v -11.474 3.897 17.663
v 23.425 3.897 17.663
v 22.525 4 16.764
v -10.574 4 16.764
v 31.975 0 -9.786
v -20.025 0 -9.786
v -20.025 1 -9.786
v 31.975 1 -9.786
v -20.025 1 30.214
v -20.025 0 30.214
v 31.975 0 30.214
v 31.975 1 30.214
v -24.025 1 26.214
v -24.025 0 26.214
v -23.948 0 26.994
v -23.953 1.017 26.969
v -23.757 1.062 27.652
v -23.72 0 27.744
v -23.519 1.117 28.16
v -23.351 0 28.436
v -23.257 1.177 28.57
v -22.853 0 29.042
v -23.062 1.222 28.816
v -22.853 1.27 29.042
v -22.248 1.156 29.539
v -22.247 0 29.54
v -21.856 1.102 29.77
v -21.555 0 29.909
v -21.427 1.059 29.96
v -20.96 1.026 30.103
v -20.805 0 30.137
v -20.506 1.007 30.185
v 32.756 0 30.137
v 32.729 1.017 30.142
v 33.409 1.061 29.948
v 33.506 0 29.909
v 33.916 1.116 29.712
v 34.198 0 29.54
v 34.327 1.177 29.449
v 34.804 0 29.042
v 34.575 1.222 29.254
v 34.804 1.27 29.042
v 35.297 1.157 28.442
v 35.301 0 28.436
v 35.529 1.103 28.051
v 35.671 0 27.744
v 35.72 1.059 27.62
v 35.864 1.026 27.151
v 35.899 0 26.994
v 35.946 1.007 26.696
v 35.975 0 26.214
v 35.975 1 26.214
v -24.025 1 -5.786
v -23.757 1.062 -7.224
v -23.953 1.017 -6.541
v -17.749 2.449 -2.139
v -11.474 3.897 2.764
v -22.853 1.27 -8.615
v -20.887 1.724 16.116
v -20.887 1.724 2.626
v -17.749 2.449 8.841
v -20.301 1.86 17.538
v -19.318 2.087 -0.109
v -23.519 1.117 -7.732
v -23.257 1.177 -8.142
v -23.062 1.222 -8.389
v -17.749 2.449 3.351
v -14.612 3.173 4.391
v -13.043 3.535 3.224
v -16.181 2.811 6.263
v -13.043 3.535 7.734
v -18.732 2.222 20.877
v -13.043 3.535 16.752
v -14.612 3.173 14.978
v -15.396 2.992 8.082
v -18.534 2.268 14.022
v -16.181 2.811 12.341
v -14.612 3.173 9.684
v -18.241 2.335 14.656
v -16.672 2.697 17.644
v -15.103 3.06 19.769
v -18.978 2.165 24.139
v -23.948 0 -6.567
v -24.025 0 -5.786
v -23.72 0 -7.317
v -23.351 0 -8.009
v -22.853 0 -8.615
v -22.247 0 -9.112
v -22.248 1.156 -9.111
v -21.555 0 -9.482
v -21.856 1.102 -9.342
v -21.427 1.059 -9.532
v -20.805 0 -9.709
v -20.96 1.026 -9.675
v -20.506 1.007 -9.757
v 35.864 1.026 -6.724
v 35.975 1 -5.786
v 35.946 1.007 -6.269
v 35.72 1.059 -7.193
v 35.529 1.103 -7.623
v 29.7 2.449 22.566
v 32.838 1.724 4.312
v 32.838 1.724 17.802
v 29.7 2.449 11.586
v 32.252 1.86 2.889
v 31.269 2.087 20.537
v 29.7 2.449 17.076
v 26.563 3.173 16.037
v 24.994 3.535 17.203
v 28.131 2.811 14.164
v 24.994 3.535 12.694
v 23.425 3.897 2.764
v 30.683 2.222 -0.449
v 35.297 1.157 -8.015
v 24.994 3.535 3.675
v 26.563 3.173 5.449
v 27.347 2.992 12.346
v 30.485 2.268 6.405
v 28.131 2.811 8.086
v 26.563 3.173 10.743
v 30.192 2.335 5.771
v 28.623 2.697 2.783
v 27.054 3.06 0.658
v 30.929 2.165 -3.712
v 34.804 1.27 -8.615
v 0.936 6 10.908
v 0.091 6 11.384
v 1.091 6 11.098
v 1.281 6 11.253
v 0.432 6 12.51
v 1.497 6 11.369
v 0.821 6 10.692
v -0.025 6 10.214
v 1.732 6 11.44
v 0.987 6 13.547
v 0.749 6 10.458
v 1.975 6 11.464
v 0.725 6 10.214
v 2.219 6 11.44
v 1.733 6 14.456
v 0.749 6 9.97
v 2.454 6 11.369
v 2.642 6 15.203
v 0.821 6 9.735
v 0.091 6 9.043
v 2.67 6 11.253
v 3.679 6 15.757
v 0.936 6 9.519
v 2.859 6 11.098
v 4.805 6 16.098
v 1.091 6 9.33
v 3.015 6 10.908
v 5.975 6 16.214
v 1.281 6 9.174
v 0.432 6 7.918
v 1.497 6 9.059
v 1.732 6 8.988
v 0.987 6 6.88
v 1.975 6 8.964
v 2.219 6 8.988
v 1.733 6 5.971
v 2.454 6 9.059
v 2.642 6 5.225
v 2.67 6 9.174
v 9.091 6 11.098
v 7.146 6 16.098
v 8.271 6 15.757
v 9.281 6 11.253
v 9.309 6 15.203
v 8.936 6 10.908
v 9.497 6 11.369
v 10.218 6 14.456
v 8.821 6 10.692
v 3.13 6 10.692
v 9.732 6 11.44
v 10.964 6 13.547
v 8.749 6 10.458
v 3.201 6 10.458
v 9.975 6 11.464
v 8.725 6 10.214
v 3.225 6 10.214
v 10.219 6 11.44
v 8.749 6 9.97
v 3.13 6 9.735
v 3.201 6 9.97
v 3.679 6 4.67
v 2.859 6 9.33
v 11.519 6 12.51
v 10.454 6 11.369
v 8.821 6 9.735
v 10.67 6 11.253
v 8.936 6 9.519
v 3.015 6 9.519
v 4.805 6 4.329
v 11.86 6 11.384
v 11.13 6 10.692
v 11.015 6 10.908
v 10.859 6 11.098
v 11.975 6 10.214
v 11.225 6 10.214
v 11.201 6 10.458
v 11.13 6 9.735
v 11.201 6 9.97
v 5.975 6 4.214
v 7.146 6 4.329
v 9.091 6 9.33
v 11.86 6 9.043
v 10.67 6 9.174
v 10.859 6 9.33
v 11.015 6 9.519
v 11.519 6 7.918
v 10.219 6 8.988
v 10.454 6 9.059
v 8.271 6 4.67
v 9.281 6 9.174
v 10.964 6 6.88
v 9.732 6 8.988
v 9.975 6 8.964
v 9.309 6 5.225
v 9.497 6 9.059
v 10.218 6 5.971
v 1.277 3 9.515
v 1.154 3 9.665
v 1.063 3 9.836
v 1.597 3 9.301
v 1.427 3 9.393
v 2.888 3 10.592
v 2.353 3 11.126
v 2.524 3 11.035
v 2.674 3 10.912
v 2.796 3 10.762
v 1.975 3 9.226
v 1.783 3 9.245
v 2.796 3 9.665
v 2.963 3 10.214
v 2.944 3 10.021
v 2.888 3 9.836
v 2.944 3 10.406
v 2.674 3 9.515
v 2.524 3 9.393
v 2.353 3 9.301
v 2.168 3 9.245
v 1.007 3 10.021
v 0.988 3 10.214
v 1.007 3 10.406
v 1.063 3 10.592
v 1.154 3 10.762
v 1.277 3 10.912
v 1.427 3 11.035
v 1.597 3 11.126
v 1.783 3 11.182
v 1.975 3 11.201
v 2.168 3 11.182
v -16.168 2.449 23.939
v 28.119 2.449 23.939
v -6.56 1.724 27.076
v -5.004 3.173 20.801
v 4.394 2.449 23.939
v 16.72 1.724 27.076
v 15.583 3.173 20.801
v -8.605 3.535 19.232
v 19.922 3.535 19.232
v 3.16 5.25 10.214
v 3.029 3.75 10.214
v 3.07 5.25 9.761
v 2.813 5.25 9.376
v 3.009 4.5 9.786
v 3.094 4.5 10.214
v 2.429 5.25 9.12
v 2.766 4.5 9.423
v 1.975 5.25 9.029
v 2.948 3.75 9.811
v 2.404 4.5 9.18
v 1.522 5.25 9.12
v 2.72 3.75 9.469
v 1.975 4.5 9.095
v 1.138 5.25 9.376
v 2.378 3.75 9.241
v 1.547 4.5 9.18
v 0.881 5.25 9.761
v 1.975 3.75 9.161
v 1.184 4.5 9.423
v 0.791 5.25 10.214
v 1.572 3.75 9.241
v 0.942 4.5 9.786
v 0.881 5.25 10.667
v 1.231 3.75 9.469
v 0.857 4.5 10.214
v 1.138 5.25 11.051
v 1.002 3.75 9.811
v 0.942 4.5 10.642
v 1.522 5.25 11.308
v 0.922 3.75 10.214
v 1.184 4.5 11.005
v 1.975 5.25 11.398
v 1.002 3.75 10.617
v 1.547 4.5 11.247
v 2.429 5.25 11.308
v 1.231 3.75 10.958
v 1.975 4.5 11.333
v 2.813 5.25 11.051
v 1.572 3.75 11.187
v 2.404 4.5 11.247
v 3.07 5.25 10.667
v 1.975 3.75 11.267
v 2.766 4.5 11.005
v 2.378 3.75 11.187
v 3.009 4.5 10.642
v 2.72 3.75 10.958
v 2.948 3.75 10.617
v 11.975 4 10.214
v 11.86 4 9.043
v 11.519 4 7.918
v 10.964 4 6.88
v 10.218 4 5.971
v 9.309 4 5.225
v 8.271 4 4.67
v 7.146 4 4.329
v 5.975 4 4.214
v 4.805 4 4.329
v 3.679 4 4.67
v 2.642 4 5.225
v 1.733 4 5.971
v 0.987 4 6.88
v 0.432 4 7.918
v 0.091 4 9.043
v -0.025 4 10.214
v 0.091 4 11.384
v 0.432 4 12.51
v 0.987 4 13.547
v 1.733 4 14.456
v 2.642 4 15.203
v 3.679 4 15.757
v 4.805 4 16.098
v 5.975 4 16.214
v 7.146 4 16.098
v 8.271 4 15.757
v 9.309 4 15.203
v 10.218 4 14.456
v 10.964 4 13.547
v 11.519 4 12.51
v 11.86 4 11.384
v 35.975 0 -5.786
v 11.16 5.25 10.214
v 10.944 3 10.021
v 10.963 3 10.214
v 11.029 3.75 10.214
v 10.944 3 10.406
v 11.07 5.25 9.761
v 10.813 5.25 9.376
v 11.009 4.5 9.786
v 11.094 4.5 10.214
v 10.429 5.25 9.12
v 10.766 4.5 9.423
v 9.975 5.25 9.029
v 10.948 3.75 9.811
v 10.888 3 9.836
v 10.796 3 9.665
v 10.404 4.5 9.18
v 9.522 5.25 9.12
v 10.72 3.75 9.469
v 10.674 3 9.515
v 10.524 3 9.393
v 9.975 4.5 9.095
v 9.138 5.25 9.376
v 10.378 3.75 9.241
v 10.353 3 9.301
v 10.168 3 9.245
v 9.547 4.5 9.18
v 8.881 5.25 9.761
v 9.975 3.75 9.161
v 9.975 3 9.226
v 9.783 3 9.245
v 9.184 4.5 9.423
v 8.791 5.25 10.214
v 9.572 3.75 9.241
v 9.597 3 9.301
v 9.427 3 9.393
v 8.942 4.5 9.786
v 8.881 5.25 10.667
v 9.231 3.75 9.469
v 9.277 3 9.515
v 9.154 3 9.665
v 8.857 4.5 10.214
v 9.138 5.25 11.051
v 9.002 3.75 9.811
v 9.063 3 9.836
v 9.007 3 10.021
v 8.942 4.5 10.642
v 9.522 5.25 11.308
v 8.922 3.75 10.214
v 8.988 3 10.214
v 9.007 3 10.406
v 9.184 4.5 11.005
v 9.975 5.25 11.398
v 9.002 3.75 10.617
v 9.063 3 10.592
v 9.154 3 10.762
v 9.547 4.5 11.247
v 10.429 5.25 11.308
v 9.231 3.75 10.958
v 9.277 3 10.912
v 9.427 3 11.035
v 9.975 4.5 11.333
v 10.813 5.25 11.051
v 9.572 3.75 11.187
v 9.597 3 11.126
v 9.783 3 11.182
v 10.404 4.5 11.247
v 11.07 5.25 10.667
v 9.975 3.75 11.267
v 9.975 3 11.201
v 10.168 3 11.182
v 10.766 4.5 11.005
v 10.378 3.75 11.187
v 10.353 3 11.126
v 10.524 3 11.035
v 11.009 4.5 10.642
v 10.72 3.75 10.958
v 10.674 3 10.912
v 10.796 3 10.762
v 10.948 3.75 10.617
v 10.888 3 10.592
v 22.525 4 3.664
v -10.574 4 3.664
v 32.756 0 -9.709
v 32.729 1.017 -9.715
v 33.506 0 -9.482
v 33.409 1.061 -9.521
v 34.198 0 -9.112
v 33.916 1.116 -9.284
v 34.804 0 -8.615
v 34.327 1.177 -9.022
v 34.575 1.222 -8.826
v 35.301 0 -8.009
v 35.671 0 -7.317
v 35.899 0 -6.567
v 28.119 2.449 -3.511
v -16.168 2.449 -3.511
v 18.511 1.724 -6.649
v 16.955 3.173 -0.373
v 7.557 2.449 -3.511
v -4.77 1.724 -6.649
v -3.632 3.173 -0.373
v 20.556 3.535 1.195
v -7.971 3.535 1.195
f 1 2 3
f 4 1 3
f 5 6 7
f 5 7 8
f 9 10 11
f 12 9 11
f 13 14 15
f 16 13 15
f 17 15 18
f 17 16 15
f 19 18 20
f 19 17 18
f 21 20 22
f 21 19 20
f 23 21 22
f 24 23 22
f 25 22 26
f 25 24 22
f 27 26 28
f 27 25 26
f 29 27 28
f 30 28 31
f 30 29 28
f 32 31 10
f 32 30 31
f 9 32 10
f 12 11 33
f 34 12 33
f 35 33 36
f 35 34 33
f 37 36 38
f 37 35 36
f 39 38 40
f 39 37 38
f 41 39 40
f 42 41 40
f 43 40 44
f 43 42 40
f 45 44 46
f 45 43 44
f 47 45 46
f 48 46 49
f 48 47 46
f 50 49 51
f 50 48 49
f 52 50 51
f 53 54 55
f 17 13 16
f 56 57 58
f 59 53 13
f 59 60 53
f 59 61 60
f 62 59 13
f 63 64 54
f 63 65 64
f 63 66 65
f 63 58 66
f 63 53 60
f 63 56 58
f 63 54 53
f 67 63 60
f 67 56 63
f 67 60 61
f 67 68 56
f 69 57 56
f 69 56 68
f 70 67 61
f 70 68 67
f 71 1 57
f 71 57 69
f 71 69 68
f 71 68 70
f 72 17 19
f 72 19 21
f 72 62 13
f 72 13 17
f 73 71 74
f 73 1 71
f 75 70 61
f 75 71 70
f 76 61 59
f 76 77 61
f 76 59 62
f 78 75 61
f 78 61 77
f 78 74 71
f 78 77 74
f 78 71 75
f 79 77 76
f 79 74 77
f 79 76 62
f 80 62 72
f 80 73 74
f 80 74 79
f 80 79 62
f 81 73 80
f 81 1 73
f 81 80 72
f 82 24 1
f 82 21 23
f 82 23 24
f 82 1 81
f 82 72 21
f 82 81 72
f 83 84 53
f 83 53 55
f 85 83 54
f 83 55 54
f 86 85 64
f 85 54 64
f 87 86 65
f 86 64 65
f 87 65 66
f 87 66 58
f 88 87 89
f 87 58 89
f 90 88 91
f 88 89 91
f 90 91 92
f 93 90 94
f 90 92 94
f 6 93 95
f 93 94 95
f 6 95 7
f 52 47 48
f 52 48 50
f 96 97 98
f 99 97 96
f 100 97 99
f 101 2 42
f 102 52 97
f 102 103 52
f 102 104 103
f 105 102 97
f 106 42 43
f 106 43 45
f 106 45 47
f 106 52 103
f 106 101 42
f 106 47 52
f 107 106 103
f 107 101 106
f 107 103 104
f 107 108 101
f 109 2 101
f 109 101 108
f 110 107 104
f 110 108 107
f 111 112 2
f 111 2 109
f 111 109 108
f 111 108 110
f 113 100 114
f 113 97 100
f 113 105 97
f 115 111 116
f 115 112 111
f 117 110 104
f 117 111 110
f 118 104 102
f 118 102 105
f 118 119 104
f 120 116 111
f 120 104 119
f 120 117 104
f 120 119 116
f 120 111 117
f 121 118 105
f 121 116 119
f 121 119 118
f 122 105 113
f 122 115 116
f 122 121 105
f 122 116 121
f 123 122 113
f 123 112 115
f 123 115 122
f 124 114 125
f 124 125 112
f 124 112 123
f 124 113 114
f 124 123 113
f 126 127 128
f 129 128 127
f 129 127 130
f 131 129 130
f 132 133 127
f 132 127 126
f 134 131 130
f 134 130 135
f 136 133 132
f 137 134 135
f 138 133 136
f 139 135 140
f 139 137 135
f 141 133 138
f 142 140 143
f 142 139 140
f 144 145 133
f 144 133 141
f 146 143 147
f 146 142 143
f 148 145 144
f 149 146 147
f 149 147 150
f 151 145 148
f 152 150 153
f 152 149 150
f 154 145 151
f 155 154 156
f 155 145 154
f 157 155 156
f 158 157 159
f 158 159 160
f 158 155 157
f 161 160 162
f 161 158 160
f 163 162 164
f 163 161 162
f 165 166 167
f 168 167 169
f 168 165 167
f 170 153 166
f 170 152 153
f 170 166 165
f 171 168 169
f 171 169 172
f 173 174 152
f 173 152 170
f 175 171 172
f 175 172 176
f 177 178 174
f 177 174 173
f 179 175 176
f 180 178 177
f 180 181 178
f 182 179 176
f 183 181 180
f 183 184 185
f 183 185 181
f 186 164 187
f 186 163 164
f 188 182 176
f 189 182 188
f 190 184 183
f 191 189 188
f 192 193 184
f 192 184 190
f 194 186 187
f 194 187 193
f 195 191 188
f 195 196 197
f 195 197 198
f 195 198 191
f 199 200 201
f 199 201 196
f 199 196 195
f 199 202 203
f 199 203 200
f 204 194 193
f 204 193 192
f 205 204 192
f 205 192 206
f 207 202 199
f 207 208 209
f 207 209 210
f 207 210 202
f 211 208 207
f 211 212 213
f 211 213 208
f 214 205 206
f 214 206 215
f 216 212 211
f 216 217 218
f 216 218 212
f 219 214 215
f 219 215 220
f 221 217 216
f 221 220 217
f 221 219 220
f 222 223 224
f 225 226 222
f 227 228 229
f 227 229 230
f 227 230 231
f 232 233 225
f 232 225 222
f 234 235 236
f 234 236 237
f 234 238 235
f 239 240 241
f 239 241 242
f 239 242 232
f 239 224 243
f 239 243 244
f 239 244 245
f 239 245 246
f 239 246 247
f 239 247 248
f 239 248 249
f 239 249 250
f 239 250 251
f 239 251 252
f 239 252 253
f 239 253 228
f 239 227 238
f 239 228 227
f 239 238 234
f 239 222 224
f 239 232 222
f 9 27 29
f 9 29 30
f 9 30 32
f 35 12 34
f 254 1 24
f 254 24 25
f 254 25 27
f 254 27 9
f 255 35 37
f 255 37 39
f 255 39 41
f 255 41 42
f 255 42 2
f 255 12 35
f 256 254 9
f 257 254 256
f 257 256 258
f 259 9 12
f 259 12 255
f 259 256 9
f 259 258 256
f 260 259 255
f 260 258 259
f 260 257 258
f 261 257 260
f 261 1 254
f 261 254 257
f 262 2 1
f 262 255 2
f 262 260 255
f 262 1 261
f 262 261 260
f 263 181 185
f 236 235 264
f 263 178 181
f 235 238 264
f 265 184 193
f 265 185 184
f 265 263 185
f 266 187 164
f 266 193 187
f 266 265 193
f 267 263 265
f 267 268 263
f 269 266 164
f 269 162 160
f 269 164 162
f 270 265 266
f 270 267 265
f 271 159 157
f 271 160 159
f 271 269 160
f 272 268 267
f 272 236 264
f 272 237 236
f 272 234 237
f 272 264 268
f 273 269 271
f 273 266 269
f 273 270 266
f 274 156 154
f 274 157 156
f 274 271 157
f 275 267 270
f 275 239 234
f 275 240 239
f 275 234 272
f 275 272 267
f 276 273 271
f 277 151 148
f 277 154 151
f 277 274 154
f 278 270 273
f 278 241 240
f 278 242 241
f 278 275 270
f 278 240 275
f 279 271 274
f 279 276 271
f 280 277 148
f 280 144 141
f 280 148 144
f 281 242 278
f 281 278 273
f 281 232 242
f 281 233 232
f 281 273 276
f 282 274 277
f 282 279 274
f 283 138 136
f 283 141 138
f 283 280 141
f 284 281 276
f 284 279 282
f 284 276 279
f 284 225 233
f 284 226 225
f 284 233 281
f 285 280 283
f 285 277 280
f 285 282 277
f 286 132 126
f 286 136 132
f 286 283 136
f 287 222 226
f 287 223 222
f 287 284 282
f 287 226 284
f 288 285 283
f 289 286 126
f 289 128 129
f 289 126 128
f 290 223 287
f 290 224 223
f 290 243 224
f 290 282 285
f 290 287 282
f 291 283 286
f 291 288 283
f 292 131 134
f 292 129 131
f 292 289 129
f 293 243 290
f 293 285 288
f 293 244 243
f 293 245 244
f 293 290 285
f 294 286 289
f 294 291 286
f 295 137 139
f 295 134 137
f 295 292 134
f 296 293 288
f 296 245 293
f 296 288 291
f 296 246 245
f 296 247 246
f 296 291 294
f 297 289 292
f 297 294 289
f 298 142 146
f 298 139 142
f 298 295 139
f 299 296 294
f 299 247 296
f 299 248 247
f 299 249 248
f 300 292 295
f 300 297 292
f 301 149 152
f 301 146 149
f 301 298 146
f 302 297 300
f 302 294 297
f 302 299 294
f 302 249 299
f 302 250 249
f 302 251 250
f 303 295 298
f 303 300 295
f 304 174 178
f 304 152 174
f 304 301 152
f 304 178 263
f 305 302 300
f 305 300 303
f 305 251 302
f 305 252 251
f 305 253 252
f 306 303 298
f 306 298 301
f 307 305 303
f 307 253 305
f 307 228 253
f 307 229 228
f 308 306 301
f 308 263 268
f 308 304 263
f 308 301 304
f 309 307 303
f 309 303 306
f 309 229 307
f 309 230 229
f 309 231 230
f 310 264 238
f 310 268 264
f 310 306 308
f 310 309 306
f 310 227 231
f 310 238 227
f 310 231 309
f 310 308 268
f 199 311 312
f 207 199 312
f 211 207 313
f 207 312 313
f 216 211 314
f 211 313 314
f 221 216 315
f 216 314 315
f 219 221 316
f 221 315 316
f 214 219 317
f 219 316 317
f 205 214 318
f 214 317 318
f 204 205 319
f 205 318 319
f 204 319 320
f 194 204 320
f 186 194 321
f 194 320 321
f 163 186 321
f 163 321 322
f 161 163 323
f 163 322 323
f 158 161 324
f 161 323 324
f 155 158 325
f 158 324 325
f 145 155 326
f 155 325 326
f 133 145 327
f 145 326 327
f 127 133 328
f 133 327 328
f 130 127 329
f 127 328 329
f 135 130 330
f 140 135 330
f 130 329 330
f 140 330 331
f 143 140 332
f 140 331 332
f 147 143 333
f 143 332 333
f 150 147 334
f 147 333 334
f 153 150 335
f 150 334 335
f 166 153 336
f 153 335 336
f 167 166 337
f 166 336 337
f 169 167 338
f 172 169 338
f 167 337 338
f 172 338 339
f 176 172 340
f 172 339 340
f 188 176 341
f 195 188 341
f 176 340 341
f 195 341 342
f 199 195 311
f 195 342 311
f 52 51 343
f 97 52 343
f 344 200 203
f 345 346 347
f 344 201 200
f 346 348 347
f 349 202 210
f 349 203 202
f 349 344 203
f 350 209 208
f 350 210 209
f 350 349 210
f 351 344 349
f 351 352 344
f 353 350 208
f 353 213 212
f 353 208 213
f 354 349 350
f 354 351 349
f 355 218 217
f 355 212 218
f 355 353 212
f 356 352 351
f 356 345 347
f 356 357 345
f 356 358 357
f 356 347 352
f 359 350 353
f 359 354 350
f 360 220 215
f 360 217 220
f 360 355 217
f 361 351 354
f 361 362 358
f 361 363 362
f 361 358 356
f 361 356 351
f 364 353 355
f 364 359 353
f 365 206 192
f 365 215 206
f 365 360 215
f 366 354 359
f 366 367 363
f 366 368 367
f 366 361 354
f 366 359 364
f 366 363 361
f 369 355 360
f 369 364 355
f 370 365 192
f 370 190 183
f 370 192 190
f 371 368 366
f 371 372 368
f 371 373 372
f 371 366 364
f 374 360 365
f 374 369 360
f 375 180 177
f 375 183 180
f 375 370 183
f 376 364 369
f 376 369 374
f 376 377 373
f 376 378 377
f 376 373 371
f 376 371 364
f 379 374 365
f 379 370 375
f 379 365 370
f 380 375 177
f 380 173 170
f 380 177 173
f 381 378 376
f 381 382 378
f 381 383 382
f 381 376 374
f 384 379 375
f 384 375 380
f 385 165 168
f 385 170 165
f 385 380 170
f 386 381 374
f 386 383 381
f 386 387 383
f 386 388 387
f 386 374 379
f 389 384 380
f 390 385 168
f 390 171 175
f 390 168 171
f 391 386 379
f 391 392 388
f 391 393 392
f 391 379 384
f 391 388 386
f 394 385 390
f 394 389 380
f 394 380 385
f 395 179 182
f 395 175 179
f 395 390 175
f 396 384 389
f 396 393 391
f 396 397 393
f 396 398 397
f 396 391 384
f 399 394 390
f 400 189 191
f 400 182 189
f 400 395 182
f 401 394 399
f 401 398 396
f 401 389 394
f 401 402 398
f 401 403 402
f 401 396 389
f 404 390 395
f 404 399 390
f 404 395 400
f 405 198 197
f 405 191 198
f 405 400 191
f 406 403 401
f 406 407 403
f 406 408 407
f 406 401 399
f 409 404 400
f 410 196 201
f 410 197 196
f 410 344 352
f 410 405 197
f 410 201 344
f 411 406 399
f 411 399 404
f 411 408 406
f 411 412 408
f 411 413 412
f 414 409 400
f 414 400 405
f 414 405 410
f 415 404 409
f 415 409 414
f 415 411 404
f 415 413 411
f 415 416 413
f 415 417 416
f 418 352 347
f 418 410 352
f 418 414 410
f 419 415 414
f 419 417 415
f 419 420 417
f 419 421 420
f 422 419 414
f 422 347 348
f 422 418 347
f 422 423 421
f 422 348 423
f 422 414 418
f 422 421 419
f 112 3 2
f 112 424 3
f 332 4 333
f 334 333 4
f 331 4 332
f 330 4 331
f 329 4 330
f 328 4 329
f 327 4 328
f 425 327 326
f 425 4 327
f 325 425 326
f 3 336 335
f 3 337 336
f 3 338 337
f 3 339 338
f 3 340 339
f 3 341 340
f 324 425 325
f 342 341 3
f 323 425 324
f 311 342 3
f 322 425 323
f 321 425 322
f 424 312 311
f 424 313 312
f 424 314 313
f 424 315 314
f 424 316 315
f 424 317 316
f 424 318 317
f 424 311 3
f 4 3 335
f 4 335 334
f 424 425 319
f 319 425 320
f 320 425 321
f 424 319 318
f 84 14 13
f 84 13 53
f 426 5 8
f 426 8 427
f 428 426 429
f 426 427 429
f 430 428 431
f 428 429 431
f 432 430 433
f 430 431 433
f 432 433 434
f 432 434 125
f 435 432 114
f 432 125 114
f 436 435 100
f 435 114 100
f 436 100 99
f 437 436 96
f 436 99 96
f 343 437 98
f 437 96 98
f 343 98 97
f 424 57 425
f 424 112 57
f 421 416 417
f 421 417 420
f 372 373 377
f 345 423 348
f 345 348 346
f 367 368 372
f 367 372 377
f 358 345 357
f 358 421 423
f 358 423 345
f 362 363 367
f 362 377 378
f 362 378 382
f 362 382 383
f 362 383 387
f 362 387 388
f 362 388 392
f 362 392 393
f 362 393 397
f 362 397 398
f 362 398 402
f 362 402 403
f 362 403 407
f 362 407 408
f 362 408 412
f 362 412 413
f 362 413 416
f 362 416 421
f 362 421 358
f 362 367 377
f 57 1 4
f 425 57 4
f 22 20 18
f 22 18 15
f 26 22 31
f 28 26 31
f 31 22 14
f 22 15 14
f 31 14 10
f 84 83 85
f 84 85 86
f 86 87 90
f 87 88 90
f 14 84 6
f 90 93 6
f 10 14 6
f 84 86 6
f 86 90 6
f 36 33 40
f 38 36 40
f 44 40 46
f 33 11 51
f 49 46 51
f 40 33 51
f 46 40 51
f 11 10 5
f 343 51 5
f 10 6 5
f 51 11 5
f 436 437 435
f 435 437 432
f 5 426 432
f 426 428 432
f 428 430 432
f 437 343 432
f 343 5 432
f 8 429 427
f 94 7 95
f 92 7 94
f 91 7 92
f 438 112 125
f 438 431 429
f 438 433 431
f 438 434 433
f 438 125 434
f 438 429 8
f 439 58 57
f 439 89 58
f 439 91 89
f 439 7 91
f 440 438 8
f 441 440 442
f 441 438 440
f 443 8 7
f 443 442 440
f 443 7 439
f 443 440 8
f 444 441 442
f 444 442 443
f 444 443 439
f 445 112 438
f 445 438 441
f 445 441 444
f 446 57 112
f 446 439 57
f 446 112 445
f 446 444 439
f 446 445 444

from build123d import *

# Parameters (mm, degrees)
SKETCH_1_W          = 60
SKETCH_1_H          = 40
EXTRUDE_1_DEPTH     = 1
SKETCH_2_W          = 60
SKETCH_2_H          = 40
EXTRUDE_2_DEPTH     = 3
EXTRUDE_2_TAPER     = 77
FILLET_1_R          = 4
SKETCH_3_R          = 6
EXTRUDE_3_DEPTH     = 2
FILLET_2_R          = 4
SKETCH_4_R          = 1.25
CUT_EXTRUDE_1_DEPTH = 3
CUT_EXTRUDE_1_TAPER = 5


with BuildPart() as part:
    # 草图1 → 凸台-拉伸1 (new body)
    with BuildSketch(Plane(origin=(0, 0, 0), x_dir=(1, 0, 0), z_dir=(0, 1, 0))):
        with Locations((5.975375352, -10.213749482)):
            Rectangle(SKETCH_1_W, SKETCH_1_H)
    extrude(amount=EXTRUDE_1_DEPTH)

    # 草图2 → 凸台-拉伸2 (add)
    with BuildSketch(Plane(origin=(0, 1, 0), x_dir=(1, 0, 0), z_dir=(0, 1, 0))):
        with Locations((5.975375352, -10.213749482)):
            Rectangle(SKETCH_2_W, SKETCH_2_H)
    extrude(amount=EXTRUDE_2_DEPTH, taper=EXTRUDE_2_TAPER)

    # 圆角1
    fillet_1_edges = [part.edges().sort_by_distance(p)[0] for p in [
        (35.975375352, 0.5, 30.213749482),
        (-24.024624648, 0.5, 30.213749482),
        (-24.024624648, 0.5, -9.786250518),
        (35.975375352, 0.5, -9.786250518),
    ]]
    fillet(fillet_1_edges, radius=FILLET_1_R)

    # 草图3 → 凸台-拉伸3 (add)
    with BuildSketch(Plane(origin=(0, 4, 0), x_dir=(1, 0, 0), z_dir=(0, 1, 0))):
        with Locations((5.975375352, -10.213749482)):
            Circle(SKETCH_3_R)
    extrude(amount=EXTRUDE_3_DEPTH)

    # 圆角2
    fillet_2_edges = [part.edges().sort_by_distance(p)[0] for p in [
        (5.975375352, 4, 17.219321859),
        (22.980947729, 4, 10.213749482),
        (5.975375352, 4, 3.208177105),
        (-11.030197026, 4, 10.213749482),
    ]]
    fillet(fillet_2_edges, radius=FILLET_2_R)

    # 草图4 → 切除-拉伸1 (cut)
    with BuildSketch(Plane(origin=(0, 6, 0), x_dir=(1, 0, 0), z_dir=(0, 1, 0))):
        with Locations((1.975375352, -10.213749482)):
            Circle(SKETCH_4_R)
        with Locations((9.975375352, -10.213749482)):
            Circle(SKETCH_4_R)
    extrude(amount=-CUT_EXTRUDE_1_DEPTH, taper=CUT_EXTRUDE_1_TAPER, mode=Mode.SUBTRACT)


solid = part.part
